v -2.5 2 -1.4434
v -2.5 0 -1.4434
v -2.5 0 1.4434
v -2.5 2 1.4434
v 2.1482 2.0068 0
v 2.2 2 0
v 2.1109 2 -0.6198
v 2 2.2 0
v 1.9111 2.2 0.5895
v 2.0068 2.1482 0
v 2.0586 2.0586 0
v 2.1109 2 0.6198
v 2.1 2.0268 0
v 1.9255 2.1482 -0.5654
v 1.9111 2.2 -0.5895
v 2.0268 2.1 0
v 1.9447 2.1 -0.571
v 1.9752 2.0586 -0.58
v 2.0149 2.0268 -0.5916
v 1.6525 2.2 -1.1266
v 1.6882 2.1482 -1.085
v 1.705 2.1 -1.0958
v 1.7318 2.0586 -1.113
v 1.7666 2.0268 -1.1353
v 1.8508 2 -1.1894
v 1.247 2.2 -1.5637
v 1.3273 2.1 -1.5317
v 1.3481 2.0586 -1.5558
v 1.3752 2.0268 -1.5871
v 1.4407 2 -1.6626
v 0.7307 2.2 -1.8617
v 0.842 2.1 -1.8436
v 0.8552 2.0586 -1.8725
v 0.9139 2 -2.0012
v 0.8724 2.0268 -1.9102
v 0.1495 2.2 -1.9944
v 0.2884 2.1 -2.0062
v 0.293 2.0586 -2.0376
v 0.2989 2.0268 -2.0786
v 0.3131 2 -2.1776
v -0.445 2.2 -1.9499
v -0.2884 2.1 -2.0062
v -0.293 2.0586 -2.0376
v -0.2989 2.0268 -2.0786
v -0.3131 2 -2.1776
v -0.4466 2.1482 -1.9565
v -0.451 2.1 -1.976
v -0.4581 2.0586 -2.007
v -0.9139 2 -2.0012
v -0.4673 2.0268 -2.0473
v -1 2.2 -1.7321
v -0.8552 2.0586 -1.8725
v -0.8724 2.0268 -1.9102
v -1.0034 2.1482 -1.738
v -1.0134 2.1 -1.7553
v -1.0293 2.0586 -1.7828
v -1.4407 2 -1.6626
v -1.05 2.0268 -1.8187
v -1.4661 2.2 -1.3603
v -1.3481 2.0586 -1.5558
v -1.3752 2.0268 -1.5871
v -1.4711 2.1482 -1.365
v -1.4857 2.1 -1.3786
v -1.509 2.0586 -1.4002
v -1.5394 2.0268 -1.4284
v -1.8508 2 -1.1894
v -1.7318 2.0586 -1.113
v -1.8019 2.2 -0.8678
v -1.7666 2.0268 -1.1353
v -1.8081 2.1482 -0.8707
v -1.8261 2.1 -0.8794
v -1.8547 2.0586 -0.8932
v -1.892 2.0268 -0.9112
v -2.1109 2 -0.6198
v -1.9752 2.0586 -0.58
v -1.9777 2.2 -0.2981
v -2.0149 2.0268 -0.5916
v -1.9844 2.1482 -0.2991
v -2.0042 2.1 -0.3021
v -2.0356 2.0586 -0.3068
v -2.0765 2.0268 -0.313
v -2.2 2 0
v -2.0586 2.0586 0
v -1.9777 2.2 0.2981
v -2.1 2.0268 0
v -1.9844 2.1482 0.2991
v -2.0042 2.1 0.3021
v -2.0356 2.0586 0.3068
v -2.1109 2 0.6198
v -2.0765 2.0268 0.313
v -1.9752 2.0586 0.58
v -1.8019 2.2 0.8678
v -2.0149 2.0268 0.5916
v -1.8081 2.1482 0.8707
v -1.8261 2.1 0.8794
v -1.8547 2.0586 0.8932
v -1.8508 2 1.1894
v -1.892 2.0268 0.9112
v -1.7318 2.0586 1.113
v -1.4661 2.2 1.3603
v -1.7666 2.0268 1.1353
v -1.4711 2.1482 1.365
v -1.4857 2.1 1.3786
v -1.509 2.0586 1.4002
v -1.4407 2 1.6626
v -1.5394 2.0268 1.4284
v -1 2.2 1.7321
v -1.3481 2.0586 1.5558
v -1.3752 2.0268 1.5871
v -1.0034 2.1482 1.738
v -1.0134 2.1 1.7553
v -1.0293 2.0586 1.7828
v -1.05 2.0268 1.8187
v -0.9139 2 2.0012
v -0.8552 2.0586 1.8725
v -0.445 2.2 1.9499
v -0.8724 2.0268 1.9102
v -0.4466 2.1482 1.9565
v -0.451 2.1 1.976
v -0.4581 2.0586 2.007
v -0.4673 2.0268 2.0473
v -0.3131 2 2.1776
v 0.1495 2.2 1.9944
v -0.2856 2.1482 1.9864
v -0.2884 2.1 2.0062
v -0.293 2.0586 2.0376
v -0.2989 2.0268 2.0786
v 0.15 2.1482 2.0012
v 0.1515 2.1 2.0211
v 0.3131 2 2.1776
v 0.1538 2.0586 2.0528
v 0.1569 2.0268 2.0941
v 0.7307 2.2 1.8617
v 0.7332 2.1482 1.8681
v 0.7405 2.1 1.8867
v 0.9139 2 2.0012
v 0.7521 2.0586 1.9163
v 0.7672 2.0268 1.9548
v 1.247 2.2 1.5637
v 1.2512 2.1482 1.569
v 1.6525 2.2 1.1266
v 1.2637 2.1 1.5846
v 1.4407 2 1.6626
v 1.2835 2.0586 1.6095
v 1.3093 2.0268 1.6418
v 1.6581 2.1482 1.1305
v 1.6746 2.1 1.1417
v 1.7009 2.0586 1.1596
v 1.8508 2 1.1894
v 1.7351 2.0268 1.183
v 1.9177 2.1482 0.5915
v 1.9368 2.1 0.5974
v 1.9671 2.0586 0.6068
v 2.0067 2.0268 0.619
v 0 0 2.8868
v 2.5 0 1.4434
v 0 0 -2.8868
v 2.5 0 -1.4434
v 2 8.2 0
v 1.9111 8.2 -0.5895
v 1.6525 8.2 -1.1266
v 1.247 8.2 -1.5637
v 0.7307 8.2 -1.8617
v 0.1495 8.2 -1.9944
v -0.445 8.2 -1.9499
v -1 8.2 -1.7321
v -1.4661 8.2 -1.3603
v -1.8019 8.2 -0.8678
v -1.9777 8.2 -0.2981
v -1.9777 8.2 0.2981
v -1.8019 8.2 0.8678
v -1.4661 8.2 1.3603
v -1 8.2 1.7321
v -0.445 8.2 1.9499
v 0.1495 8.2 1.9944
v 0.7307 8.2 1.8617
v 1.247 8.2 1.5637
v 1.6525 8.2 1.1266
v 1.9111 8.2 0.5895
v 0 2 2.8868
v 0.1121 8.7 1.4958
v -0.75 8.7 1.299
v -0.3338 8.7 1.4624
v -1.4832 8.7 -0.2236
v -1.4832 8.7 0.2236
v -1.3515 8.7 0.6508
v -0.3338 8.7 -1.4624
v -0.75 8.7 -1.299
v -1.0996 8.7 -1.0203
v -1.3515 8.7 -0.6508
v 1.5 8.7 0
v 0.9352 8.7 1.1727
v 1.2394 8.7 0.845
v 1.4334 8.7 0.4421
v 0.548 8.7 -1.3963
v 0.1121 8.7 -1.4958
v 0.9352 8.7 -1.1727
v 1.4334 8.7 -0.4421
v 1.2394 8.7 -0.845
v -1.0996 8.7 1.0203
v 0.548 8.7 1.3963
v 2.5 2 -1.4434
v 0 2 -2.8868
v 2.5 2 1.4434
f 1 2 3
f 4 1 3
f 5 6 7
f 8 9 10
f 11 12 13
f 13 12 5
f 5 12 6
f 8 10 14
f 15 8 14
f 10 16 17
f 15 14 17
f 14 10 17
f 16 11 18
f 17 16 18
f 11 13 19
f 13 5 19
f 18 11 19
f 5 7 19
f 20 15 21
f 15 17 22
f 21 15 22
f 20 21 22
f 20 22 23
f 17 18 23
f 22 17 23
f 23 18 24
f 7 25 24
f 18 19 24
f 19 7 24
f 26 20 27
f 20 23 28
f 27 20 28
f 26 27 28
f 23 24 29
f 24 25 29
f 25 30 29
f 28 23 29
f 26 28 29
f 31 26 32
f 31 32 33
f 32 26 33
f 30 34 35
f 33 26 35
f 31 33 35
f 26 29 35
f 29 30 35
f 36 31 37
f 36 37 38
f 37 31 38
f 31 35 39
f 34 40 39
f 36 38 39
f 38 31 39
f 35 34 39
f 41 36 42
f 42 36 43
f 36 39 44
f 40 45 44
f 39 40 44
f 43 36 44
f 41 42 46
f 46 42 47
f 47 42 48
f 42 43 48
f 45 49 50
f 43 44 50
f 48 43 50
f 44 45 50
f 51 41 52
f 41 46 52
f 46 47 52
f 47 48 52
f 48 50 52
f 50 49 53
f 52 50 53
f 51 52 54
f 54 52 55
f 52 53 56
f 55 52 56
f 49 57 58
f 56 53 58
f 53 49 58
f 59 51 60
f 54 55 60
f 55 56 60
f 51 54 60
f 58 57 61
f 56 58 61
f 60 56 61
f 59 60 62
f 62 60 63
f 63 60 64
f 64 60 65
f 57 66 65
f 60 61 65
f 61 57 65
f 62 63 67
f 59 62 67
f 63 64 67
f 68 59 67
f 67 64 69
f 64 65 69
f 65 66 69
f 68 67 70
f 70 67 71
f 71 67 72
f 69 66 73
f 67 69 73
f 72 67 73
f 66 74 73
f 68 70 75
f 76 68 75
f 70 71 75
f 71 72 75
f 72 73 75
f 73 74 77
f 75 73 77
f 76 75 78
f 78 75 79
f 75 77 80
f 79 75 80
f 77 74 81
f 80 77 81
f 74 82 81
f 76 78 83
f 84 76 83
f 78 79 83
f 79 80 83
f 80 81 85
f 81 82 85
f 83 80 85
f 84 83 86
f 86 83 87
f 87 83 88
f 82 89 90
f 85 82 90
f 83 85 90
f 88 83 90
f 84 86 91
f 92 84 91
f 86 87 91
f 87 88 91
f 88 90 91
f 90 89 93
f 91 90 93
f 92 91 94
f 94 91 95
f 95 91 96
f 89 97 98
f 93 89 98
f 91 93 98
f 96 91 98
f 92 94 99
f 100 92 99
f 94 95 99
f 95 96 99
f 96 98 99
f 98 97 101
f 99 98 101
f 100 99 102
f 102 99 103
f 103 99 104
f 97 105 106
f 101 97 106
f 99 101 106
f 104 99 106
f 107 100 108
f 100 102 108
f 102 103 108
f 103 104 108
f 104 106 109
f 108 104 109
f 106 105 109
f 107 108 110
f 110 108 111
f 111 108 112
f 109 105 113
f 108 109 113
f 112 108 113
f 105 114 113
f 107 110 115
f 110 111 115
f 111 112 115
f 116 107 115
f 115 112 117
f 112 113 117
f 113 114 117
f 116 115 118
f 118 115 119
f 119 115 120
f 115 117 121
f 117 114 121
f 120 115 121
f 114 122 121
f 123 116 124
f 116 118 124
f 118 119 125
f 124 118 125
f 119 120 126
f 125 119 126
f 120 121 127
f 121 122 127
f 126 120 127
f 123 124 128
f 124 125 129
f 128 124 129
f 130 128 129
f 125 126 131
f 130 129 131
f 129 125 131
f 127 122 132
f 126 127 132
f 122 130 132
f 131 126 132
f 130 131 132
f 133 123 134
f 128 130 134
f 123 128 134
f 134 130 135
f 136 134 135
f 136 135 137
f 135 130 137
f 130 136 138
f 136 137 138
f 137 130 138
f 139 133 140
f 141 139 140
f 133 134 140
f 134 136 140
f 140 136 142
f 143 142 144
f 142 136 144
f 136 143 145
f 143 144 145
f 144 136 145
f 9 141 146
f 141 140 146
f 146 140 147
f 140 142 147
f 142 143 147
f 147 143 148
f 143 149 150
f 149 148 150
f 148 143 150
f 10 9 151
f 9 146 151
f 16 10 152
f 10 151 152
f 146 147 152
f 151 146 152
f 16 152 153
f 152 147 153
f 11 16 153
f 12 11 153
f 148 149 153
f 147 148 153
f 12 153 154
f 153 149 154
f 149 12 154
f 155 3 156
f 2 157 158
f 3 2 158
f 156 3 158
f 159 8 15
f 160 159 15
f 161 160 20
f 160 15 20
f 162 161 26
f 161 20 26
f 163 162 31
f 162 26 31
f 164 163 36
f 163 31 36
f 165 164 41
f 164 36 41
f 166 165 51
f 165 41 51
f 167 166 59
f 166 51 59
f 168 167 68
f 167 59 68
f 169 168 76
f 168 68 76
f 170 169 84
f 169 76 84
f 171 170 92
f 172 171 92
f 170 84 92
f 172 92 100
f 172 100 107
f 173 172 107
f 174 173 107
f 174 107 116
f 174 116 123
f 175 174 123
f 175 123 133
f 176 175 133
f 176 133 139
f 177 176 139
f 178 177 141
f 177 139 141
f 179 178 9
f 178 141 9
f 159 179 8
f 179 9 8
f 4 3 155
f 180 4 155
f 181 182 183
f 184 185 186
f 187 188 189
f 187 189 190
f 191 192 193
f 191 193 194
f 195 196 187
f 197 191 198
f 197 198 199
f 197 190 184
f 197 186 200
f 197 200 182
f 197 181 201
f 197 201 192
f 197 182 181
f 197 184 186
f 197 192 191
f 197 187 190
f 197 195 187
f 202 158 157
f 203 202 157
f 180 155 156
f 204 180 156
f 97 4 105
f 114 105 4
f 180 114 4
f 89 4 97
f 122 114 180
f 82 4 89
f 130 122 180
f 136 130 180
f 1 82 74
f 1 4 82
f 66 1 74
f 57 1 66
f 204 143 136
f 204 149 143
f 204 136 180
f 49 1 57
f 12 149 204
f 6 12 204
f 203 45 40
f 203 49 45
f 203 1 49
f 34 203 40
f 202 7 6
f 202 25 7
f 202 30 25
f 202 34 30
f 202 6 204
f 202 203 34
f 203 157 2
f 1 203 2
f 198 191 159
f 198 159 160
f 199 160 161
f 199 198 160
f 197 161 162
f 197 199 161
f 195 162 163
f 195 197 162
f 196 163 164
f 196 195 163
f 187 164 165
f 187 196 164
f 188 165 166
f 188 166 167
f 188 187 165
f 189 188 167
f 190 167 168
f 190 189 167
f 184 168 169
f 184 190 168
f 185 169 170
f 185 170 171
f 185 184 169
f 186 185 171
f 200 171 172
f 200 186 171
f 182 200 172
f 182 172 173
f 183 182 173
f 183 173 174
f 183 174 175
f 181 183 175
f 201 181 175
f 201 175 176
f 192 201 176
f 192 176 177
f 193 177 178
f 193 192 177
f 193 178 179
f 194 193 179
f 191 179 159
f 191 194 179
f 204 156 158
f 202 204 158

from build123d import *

# Parameters (mm, degrees)
BOSS_EXTRUDE1_DEPTH = 2
SKETCH2_R           = 2
BOSS_EXTRUDE2_DEPTH = 6.7
CHAMFER1_SIZE       = 0.5
FILLET1_R           = 0.2


with BuildPart() as part:
    # Sketch1 → Boss-Extrude1 (new body)
    with BuildSketch(Plane(origin=(0, 0, 0), x_dir=(1, 0, 0), z_dir=(0, 1, 0))):
        Polygon((0, 2.886751346), (-2.5, 1.443375673), (-2.5, -1.443375673), (0, -2.886751346), (2.5, -1.443375673), (2.5, 1.443375673), align=None)
    extrude(amount=BOSS_EXTRUDE1_DEPTH)

    # Sketch2 → Boss-Extrude2 (add)
    with BuildSketch(Plane(origin=(0, 2, 0), x_dir=(1, 0, 0), z_dir=(0, 1, 0))):
        Circle(SKETCH2_R)
    extrude(amount=BOSS_EXTRUDE2_DEPTH)

    # Chamfer1
    chamfer1_edges = [part.edges().sort_by_distance(p)[0] for p in [
        (-2, 8.7, 0),
    ]]
    chamfer(chamfer1_edges, length=CHAMFER1_SIZE)

    # Fillet1
    fillet1_edges = [part.edges().sort_by_distance(p)[0] for p in [
        (-2, 2, 0),
    ]]
    fillet(fillet1_edges, radius=FILLET1_R)


solid = part.part
